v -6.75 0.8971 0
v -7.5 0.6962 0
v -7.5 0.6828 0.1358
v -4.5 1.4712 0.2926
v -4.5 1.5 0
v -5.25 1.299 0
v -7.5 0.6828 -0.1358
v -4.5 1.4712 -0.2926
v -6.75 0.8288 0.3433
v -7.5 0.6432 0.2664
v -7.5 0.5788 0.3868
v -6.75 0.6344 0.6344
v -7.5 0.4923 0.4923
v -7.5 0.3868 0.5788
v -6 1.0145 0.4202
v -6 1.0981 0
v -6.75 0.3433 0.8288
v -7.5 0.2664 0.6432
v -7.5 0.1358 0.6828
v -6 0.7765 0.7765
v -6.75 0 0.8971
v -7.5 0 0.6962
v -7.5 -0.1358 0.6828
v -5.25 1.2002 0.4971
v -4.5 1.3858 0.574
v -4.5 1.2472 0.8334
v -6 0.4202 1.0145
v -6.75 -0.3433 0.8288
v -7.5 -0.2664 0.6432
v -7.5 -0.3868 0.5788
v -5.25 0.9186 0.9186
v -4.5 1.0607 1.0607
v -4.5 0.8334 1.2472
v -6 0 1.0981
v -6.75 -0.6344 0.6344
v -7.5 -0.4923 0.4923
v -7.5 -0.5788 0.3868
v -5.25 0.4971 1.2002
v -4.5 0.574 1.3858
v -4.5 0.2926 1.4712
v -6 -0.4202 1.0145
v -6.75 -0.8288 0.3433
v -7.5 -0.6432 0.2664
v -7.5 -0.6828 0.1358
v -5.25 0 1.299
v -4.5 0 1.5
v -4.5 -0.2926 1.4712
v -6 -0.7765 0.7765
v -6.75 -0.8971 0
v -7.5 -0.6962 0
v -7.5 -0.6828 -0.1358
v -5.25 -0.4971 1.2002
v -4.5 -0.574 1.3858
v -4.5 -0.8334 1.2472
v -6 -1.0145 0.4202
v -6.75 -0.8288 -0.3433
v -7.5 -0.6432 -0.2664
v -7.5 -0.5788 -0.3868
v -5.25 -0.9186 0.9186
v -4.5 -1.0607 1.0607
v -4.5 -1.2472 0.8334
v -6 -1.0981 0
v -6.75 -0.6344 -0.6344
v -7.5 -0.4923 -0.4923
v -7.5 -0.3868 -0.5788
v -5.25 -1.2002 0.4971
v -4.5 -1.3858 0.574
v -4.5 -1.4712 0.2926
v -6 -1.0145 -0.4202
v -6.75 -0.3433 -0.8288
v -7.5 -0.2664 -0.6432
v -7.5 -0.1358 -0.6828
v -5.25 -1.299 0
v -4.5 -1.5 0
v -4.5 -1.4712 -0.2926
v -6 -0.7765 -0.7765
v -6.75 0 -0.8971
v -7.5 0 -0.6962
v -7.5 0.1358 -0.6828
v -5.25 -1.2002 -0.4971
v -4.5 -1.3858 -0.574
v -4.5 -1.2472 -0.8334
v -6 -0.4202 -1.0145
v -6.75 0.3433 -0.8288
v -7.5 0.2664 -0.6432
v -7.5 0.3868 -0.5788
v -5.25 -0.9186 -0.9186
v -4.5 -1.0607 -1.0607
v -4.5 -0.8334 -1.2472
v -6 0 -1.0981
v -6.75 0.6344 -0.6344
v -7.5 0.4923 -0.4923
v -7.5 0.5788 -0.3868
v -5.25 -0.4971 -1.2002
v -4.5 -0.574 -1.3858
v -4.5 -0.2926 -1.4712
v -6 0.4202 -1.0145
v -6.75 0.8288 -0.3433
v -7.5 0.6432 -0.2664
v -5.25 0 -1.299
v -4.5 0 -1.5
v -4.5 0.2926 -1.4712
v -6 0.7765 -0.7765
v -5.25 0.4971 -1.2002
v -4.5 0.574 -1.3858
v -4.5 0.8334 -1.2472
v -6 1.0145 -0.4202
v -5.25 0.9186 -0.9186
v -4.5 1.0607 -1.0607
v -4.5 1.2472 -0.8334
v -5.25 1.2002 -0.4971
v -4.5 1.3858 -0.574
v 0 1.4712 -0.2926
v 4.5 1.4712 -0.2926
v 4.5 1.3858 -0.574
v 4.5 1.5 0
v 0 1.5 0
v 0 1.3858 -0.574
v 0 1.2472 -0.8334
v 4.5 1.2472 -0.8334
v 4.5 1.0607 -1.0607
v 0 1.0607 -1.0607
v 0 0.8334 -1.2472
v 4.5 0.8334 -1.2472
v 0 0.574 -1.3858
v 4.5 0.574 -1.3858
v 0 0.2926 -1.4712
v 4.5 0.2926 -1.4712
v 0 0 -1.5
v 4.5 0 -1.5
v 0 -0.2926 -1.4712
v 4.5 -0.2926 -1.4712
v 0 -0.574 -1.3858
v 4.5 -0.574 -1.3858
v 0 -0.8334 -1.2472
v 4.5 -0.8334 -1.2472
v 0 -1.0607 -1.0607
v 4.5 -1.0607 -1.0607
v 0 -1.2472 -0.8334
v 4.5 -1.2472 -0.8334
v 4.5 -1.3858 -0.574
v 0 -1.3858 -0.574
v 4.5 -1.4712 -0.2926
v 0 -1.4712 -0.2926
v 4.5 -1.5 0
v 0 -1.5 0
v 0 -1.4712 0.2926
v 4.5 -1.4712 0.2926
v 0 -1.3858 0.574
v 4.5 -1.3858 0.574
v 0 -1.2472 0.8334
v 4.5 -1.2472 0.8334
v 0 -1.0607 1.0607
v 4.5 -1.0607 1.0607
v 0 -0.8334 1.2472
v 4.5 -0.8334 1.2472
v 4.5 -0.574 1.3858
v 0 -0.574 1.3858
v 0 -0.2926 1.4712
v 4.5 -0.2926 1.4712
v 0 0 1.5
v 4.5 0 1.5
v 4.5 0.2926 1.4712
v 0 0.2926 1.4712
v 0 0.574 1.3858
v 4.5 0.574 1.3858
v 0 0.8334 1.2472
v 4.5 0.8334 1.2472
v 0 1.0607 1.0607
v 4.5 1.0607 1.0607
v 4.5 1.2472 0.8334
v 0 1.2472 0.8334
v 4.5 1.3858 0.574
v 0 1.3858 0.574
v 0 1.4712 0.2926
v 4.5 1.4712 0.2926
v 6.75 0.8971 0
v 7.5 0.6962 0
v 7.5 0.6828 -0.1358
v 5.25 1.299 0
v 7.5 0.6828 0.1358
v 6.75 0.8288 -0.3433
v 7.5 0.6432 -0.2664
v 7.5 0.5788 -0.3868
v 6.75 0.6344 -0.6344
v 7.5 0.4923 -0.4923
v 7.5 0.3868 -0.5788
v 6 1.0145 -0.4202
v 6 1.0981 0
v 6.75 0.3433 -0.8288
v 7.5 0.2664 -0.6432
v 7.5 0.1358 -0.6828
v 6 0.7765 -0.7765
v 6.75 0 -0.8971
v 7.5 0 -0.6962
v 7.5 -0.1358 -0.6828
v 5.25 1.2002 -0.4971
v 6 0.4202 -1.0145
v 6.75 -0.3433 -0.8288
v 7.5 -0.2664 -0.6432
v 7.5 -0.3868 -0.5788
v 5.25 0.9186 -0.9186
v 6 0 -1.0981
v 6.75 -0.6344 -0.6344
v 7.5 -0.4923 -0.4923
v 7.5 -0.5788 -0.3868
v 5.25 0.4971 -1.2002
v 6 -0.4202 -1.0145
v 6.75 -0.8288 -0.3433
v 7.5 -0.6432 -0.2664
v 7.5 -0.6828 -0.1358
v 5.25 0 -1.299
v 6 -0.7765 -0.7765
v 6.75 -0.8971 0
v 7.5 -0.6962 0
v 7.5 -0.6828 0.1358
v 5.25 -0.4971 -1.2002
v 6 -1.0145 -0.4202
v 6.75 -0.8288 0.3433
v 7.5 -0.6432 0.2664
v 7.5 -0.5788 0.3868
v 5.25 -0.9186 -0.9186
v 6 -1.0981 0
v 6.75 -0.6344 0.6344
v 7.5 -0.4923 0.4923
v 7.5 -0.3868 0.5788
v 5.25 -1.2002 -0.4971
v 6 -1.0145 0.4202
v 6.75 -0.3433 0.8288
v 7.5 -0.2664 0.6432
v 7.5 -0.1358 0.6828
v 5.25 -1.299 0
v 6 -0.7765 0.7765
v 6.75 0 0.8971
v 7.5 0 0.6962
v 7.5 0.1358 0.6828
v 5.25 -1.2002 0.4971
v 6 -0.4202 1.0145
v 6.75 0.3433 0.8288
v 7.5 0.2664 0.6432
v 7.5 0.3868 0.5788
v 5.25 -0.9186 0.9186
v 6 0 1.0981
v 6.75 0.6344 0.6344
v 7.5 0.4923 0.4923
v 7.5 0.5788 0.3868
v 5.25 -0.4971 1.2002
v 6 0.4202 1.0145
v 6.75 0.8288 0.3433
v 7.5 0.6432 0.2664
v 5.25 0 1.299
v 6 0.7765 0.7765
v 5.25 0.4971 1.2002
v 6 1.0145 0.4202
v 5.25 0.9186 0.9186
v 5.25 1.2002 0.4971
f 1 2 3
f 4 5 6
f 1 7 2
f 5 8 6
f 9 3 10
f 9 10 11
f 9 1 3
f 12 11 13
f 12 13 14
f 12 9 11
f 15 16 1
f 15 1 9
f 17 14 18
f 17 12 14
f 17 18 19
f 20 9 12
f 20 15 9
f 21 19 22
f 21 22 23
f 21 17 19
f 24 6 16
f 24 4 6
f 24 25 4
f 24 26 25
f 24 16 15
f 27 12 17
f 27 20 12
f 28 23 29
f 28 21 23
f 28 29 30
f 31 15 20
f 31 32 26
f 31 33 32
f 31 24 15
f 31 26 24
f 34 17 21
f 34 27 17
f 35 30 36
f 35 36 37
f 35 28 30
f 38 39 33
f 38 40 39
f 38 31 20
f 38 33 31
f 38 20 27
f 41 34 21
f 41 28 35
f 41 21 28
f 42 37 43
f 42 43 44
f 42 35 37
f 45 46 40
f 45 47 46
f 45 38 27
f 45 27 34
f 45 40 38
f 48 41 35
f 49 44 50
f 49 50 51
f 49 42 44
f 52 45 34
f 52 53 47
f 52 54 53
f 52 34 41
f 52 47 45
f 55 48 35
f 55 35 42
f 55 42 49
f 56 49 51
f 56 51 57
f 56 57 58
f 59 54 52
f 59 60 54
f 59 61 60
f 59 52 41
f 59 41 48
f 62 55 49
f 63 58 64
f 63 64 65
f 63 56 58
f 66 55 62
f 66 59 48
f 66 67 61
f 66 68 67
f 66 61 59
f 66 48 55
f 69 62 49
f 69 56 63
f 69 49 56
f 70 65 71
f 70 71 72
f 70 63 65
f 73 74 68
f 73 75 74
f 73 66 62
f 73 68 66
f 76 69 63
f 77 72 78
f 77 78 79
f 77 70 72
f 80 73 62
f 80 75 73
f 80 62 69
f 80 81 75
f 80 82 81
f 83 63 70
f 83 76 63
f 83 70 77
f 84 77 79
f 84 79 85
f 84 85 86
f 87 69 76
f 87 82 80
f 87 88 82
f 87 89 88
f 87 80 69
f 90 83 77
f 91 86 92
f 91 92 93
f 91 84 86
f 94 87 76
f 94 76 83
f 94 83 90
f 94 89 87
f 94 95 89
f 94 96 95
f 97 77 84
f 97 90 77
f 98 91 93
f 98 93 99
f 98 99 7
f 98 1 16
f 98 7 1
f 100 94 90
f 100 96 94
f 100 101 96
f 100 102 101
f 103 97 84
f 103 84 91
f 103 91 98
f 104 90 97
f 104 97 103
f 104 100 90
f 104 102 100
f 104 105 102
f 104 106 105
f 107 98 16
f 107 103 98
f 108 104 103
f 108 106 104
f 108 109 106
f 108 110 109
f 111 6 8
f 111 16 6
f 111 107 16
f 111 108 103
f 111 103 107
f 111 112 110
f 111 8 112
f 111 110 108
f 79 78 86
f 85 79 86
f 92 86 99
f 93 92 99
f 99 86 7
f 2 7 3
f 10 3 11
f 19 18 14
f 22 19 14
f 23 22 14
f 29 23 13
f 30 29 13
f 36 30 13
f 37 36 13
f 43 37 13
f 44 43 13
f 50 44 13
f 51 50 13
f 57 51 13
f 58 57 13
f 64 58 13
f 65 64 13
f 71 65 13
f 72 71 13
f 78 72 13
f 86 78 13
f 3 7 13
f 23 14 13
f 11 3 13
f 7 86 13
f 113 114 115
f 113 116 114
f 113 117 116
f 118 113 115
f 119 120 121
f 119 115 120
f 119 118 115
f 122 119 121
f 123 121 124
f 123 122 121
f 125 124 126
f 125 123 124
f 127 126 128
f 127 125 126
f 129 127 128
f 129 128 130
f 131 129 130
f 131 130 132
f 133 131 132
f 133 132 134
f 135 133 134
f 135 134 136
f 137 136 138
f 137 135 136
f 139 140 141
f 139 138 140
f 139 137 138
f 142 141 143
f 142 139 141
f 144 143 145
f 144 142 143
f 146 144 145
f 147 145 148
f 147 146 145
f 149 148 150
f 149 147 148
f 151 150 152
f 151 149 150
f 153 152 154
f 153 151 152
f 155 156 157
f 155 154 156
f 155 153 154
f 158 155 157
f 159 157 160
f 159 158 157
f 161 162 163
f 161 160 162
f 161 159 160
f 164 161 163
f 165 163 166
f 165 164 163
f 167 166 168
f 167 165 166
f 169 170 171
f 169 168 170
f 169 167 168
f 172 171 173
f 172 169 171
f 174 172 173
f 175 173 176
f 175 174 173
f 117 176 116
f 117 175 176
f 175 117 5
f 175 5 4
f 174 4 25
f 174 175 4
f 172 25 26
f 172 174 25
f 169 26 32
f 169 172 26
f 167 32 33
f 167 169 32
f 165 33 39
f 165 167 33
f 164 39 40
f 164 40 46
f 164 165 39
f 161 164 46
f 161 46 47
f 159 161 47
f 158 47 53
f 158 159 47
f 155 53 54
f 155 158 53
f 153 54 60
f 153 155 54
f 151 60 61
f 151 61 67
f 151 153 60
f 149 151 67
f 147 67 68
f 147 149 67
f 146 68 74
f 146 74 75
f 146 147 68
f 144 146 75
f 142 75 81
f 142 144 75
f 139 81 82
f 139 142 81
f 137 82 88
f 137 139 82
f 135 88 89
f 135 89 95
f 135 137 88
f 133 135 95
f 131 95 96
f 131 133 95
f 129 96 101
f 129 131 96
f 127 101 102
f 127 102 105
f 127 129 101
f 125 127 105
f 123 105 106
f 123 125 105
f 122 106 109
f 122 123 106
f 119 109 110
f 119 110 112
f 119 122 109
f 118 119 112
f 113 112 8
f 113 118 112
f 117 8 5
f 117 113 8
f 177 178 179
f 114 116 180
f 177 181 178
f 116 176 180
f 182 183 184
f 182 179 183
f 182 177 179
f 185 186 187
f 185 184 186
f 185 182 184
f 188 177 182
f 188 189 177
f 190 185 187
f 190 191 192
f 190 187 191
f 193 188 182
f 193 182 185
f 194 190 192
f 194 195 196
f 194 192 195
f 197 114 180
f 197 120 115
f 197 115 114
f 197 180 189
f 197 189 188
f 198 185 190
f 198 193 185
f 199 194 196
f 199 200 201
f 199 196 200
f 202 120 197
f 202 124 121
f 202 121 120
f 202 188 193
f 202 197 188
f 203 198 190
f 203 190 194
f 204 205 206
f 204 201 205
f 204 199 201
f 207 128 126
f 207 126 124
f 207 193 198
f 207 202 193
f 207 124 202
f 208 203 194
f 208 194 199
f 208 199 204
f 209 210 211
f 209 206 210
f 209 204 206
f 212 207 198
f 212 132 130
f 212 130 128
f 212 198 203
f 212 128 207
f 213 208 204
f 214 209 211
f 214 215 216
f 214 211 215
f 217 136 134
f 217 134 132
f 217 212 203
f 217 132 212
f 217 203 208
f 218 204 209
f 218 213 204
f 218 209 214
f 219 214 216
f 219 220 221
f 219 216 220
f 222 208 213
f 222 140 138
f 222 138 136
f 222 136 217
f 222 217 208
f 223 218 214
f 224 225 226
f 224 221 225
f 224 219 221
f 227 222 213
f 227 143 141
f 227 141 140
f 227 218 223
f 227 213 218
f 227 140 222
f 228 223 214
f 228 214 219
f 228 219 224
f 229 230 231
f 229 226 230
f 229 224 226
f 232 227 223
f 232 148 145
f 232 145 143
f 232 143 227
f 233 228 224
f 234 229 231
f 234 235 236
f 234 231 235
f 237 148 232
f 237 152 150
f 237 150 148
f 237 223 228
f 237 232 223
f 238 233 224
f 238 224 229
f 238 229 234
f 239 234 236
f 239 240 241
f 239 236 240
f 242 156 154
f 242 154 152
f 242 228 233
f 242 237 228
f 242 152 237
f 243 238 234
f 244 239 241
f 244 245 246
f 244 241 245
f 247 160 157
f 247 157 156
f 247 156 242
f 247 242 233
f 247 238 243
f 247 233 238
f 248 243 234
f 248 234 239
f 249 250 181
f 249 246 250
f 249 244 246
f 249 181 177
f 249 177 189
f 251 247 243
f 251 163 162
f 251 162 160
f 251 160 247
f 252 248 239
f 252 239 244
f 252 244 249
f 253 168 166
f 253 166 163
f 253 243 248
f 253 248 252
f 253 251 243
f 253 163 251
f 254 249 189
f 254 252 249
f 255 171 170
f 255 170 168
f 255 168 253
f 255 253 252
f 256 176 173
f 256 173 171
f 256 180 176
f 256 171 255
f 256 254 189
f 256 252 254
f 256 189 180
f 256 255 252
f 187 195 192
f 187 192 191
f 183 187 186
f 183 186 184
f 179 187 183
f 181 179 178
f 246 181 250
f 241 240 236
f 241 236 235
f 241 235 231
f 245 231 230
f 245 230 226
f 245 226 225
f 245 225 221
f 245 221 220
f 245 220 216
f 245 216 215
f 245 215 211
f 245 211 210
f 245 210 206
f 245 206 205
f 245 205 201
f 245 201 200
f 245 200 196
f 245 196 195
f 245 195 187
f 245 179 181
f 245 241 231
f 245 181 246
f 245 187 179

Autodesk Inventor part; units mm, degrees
ref_plane "YZ Plane" through (0, 0, 0) normal (1, 0, 0) x (0, 1, 0)
ref_plane "XZ Plane" through (0, 0, 0) normal (0, 1, 0) x (-1, 0, 0)
ref_plane "XY Plane" through (0, 0, 0) normal (0, 0, 1) x (1, 0, 0)
sketch "Esquisse1" plane through (0, 0, 0) normal (1, 0, 0) x (0, 1, 0)
  circle A0 centre (0, 0) radius 1.5
  dimension "d0" = 3
extrude "Extrusion1" add sketch "Esquisse1" along normal mid plane 15
chamfer "Chanfrein2" distance 3 angle 15 1 edges at (7.5, -1.5, 0) measured on face at (5, 1.4951, -0.1207)
chamfer "Chanfrein3" distance 3 angle 15 1 edges at (-7.5, -1.5, 0) measured on face at (-5, 1.4951, -0.1207)
properties part number "goupille"
